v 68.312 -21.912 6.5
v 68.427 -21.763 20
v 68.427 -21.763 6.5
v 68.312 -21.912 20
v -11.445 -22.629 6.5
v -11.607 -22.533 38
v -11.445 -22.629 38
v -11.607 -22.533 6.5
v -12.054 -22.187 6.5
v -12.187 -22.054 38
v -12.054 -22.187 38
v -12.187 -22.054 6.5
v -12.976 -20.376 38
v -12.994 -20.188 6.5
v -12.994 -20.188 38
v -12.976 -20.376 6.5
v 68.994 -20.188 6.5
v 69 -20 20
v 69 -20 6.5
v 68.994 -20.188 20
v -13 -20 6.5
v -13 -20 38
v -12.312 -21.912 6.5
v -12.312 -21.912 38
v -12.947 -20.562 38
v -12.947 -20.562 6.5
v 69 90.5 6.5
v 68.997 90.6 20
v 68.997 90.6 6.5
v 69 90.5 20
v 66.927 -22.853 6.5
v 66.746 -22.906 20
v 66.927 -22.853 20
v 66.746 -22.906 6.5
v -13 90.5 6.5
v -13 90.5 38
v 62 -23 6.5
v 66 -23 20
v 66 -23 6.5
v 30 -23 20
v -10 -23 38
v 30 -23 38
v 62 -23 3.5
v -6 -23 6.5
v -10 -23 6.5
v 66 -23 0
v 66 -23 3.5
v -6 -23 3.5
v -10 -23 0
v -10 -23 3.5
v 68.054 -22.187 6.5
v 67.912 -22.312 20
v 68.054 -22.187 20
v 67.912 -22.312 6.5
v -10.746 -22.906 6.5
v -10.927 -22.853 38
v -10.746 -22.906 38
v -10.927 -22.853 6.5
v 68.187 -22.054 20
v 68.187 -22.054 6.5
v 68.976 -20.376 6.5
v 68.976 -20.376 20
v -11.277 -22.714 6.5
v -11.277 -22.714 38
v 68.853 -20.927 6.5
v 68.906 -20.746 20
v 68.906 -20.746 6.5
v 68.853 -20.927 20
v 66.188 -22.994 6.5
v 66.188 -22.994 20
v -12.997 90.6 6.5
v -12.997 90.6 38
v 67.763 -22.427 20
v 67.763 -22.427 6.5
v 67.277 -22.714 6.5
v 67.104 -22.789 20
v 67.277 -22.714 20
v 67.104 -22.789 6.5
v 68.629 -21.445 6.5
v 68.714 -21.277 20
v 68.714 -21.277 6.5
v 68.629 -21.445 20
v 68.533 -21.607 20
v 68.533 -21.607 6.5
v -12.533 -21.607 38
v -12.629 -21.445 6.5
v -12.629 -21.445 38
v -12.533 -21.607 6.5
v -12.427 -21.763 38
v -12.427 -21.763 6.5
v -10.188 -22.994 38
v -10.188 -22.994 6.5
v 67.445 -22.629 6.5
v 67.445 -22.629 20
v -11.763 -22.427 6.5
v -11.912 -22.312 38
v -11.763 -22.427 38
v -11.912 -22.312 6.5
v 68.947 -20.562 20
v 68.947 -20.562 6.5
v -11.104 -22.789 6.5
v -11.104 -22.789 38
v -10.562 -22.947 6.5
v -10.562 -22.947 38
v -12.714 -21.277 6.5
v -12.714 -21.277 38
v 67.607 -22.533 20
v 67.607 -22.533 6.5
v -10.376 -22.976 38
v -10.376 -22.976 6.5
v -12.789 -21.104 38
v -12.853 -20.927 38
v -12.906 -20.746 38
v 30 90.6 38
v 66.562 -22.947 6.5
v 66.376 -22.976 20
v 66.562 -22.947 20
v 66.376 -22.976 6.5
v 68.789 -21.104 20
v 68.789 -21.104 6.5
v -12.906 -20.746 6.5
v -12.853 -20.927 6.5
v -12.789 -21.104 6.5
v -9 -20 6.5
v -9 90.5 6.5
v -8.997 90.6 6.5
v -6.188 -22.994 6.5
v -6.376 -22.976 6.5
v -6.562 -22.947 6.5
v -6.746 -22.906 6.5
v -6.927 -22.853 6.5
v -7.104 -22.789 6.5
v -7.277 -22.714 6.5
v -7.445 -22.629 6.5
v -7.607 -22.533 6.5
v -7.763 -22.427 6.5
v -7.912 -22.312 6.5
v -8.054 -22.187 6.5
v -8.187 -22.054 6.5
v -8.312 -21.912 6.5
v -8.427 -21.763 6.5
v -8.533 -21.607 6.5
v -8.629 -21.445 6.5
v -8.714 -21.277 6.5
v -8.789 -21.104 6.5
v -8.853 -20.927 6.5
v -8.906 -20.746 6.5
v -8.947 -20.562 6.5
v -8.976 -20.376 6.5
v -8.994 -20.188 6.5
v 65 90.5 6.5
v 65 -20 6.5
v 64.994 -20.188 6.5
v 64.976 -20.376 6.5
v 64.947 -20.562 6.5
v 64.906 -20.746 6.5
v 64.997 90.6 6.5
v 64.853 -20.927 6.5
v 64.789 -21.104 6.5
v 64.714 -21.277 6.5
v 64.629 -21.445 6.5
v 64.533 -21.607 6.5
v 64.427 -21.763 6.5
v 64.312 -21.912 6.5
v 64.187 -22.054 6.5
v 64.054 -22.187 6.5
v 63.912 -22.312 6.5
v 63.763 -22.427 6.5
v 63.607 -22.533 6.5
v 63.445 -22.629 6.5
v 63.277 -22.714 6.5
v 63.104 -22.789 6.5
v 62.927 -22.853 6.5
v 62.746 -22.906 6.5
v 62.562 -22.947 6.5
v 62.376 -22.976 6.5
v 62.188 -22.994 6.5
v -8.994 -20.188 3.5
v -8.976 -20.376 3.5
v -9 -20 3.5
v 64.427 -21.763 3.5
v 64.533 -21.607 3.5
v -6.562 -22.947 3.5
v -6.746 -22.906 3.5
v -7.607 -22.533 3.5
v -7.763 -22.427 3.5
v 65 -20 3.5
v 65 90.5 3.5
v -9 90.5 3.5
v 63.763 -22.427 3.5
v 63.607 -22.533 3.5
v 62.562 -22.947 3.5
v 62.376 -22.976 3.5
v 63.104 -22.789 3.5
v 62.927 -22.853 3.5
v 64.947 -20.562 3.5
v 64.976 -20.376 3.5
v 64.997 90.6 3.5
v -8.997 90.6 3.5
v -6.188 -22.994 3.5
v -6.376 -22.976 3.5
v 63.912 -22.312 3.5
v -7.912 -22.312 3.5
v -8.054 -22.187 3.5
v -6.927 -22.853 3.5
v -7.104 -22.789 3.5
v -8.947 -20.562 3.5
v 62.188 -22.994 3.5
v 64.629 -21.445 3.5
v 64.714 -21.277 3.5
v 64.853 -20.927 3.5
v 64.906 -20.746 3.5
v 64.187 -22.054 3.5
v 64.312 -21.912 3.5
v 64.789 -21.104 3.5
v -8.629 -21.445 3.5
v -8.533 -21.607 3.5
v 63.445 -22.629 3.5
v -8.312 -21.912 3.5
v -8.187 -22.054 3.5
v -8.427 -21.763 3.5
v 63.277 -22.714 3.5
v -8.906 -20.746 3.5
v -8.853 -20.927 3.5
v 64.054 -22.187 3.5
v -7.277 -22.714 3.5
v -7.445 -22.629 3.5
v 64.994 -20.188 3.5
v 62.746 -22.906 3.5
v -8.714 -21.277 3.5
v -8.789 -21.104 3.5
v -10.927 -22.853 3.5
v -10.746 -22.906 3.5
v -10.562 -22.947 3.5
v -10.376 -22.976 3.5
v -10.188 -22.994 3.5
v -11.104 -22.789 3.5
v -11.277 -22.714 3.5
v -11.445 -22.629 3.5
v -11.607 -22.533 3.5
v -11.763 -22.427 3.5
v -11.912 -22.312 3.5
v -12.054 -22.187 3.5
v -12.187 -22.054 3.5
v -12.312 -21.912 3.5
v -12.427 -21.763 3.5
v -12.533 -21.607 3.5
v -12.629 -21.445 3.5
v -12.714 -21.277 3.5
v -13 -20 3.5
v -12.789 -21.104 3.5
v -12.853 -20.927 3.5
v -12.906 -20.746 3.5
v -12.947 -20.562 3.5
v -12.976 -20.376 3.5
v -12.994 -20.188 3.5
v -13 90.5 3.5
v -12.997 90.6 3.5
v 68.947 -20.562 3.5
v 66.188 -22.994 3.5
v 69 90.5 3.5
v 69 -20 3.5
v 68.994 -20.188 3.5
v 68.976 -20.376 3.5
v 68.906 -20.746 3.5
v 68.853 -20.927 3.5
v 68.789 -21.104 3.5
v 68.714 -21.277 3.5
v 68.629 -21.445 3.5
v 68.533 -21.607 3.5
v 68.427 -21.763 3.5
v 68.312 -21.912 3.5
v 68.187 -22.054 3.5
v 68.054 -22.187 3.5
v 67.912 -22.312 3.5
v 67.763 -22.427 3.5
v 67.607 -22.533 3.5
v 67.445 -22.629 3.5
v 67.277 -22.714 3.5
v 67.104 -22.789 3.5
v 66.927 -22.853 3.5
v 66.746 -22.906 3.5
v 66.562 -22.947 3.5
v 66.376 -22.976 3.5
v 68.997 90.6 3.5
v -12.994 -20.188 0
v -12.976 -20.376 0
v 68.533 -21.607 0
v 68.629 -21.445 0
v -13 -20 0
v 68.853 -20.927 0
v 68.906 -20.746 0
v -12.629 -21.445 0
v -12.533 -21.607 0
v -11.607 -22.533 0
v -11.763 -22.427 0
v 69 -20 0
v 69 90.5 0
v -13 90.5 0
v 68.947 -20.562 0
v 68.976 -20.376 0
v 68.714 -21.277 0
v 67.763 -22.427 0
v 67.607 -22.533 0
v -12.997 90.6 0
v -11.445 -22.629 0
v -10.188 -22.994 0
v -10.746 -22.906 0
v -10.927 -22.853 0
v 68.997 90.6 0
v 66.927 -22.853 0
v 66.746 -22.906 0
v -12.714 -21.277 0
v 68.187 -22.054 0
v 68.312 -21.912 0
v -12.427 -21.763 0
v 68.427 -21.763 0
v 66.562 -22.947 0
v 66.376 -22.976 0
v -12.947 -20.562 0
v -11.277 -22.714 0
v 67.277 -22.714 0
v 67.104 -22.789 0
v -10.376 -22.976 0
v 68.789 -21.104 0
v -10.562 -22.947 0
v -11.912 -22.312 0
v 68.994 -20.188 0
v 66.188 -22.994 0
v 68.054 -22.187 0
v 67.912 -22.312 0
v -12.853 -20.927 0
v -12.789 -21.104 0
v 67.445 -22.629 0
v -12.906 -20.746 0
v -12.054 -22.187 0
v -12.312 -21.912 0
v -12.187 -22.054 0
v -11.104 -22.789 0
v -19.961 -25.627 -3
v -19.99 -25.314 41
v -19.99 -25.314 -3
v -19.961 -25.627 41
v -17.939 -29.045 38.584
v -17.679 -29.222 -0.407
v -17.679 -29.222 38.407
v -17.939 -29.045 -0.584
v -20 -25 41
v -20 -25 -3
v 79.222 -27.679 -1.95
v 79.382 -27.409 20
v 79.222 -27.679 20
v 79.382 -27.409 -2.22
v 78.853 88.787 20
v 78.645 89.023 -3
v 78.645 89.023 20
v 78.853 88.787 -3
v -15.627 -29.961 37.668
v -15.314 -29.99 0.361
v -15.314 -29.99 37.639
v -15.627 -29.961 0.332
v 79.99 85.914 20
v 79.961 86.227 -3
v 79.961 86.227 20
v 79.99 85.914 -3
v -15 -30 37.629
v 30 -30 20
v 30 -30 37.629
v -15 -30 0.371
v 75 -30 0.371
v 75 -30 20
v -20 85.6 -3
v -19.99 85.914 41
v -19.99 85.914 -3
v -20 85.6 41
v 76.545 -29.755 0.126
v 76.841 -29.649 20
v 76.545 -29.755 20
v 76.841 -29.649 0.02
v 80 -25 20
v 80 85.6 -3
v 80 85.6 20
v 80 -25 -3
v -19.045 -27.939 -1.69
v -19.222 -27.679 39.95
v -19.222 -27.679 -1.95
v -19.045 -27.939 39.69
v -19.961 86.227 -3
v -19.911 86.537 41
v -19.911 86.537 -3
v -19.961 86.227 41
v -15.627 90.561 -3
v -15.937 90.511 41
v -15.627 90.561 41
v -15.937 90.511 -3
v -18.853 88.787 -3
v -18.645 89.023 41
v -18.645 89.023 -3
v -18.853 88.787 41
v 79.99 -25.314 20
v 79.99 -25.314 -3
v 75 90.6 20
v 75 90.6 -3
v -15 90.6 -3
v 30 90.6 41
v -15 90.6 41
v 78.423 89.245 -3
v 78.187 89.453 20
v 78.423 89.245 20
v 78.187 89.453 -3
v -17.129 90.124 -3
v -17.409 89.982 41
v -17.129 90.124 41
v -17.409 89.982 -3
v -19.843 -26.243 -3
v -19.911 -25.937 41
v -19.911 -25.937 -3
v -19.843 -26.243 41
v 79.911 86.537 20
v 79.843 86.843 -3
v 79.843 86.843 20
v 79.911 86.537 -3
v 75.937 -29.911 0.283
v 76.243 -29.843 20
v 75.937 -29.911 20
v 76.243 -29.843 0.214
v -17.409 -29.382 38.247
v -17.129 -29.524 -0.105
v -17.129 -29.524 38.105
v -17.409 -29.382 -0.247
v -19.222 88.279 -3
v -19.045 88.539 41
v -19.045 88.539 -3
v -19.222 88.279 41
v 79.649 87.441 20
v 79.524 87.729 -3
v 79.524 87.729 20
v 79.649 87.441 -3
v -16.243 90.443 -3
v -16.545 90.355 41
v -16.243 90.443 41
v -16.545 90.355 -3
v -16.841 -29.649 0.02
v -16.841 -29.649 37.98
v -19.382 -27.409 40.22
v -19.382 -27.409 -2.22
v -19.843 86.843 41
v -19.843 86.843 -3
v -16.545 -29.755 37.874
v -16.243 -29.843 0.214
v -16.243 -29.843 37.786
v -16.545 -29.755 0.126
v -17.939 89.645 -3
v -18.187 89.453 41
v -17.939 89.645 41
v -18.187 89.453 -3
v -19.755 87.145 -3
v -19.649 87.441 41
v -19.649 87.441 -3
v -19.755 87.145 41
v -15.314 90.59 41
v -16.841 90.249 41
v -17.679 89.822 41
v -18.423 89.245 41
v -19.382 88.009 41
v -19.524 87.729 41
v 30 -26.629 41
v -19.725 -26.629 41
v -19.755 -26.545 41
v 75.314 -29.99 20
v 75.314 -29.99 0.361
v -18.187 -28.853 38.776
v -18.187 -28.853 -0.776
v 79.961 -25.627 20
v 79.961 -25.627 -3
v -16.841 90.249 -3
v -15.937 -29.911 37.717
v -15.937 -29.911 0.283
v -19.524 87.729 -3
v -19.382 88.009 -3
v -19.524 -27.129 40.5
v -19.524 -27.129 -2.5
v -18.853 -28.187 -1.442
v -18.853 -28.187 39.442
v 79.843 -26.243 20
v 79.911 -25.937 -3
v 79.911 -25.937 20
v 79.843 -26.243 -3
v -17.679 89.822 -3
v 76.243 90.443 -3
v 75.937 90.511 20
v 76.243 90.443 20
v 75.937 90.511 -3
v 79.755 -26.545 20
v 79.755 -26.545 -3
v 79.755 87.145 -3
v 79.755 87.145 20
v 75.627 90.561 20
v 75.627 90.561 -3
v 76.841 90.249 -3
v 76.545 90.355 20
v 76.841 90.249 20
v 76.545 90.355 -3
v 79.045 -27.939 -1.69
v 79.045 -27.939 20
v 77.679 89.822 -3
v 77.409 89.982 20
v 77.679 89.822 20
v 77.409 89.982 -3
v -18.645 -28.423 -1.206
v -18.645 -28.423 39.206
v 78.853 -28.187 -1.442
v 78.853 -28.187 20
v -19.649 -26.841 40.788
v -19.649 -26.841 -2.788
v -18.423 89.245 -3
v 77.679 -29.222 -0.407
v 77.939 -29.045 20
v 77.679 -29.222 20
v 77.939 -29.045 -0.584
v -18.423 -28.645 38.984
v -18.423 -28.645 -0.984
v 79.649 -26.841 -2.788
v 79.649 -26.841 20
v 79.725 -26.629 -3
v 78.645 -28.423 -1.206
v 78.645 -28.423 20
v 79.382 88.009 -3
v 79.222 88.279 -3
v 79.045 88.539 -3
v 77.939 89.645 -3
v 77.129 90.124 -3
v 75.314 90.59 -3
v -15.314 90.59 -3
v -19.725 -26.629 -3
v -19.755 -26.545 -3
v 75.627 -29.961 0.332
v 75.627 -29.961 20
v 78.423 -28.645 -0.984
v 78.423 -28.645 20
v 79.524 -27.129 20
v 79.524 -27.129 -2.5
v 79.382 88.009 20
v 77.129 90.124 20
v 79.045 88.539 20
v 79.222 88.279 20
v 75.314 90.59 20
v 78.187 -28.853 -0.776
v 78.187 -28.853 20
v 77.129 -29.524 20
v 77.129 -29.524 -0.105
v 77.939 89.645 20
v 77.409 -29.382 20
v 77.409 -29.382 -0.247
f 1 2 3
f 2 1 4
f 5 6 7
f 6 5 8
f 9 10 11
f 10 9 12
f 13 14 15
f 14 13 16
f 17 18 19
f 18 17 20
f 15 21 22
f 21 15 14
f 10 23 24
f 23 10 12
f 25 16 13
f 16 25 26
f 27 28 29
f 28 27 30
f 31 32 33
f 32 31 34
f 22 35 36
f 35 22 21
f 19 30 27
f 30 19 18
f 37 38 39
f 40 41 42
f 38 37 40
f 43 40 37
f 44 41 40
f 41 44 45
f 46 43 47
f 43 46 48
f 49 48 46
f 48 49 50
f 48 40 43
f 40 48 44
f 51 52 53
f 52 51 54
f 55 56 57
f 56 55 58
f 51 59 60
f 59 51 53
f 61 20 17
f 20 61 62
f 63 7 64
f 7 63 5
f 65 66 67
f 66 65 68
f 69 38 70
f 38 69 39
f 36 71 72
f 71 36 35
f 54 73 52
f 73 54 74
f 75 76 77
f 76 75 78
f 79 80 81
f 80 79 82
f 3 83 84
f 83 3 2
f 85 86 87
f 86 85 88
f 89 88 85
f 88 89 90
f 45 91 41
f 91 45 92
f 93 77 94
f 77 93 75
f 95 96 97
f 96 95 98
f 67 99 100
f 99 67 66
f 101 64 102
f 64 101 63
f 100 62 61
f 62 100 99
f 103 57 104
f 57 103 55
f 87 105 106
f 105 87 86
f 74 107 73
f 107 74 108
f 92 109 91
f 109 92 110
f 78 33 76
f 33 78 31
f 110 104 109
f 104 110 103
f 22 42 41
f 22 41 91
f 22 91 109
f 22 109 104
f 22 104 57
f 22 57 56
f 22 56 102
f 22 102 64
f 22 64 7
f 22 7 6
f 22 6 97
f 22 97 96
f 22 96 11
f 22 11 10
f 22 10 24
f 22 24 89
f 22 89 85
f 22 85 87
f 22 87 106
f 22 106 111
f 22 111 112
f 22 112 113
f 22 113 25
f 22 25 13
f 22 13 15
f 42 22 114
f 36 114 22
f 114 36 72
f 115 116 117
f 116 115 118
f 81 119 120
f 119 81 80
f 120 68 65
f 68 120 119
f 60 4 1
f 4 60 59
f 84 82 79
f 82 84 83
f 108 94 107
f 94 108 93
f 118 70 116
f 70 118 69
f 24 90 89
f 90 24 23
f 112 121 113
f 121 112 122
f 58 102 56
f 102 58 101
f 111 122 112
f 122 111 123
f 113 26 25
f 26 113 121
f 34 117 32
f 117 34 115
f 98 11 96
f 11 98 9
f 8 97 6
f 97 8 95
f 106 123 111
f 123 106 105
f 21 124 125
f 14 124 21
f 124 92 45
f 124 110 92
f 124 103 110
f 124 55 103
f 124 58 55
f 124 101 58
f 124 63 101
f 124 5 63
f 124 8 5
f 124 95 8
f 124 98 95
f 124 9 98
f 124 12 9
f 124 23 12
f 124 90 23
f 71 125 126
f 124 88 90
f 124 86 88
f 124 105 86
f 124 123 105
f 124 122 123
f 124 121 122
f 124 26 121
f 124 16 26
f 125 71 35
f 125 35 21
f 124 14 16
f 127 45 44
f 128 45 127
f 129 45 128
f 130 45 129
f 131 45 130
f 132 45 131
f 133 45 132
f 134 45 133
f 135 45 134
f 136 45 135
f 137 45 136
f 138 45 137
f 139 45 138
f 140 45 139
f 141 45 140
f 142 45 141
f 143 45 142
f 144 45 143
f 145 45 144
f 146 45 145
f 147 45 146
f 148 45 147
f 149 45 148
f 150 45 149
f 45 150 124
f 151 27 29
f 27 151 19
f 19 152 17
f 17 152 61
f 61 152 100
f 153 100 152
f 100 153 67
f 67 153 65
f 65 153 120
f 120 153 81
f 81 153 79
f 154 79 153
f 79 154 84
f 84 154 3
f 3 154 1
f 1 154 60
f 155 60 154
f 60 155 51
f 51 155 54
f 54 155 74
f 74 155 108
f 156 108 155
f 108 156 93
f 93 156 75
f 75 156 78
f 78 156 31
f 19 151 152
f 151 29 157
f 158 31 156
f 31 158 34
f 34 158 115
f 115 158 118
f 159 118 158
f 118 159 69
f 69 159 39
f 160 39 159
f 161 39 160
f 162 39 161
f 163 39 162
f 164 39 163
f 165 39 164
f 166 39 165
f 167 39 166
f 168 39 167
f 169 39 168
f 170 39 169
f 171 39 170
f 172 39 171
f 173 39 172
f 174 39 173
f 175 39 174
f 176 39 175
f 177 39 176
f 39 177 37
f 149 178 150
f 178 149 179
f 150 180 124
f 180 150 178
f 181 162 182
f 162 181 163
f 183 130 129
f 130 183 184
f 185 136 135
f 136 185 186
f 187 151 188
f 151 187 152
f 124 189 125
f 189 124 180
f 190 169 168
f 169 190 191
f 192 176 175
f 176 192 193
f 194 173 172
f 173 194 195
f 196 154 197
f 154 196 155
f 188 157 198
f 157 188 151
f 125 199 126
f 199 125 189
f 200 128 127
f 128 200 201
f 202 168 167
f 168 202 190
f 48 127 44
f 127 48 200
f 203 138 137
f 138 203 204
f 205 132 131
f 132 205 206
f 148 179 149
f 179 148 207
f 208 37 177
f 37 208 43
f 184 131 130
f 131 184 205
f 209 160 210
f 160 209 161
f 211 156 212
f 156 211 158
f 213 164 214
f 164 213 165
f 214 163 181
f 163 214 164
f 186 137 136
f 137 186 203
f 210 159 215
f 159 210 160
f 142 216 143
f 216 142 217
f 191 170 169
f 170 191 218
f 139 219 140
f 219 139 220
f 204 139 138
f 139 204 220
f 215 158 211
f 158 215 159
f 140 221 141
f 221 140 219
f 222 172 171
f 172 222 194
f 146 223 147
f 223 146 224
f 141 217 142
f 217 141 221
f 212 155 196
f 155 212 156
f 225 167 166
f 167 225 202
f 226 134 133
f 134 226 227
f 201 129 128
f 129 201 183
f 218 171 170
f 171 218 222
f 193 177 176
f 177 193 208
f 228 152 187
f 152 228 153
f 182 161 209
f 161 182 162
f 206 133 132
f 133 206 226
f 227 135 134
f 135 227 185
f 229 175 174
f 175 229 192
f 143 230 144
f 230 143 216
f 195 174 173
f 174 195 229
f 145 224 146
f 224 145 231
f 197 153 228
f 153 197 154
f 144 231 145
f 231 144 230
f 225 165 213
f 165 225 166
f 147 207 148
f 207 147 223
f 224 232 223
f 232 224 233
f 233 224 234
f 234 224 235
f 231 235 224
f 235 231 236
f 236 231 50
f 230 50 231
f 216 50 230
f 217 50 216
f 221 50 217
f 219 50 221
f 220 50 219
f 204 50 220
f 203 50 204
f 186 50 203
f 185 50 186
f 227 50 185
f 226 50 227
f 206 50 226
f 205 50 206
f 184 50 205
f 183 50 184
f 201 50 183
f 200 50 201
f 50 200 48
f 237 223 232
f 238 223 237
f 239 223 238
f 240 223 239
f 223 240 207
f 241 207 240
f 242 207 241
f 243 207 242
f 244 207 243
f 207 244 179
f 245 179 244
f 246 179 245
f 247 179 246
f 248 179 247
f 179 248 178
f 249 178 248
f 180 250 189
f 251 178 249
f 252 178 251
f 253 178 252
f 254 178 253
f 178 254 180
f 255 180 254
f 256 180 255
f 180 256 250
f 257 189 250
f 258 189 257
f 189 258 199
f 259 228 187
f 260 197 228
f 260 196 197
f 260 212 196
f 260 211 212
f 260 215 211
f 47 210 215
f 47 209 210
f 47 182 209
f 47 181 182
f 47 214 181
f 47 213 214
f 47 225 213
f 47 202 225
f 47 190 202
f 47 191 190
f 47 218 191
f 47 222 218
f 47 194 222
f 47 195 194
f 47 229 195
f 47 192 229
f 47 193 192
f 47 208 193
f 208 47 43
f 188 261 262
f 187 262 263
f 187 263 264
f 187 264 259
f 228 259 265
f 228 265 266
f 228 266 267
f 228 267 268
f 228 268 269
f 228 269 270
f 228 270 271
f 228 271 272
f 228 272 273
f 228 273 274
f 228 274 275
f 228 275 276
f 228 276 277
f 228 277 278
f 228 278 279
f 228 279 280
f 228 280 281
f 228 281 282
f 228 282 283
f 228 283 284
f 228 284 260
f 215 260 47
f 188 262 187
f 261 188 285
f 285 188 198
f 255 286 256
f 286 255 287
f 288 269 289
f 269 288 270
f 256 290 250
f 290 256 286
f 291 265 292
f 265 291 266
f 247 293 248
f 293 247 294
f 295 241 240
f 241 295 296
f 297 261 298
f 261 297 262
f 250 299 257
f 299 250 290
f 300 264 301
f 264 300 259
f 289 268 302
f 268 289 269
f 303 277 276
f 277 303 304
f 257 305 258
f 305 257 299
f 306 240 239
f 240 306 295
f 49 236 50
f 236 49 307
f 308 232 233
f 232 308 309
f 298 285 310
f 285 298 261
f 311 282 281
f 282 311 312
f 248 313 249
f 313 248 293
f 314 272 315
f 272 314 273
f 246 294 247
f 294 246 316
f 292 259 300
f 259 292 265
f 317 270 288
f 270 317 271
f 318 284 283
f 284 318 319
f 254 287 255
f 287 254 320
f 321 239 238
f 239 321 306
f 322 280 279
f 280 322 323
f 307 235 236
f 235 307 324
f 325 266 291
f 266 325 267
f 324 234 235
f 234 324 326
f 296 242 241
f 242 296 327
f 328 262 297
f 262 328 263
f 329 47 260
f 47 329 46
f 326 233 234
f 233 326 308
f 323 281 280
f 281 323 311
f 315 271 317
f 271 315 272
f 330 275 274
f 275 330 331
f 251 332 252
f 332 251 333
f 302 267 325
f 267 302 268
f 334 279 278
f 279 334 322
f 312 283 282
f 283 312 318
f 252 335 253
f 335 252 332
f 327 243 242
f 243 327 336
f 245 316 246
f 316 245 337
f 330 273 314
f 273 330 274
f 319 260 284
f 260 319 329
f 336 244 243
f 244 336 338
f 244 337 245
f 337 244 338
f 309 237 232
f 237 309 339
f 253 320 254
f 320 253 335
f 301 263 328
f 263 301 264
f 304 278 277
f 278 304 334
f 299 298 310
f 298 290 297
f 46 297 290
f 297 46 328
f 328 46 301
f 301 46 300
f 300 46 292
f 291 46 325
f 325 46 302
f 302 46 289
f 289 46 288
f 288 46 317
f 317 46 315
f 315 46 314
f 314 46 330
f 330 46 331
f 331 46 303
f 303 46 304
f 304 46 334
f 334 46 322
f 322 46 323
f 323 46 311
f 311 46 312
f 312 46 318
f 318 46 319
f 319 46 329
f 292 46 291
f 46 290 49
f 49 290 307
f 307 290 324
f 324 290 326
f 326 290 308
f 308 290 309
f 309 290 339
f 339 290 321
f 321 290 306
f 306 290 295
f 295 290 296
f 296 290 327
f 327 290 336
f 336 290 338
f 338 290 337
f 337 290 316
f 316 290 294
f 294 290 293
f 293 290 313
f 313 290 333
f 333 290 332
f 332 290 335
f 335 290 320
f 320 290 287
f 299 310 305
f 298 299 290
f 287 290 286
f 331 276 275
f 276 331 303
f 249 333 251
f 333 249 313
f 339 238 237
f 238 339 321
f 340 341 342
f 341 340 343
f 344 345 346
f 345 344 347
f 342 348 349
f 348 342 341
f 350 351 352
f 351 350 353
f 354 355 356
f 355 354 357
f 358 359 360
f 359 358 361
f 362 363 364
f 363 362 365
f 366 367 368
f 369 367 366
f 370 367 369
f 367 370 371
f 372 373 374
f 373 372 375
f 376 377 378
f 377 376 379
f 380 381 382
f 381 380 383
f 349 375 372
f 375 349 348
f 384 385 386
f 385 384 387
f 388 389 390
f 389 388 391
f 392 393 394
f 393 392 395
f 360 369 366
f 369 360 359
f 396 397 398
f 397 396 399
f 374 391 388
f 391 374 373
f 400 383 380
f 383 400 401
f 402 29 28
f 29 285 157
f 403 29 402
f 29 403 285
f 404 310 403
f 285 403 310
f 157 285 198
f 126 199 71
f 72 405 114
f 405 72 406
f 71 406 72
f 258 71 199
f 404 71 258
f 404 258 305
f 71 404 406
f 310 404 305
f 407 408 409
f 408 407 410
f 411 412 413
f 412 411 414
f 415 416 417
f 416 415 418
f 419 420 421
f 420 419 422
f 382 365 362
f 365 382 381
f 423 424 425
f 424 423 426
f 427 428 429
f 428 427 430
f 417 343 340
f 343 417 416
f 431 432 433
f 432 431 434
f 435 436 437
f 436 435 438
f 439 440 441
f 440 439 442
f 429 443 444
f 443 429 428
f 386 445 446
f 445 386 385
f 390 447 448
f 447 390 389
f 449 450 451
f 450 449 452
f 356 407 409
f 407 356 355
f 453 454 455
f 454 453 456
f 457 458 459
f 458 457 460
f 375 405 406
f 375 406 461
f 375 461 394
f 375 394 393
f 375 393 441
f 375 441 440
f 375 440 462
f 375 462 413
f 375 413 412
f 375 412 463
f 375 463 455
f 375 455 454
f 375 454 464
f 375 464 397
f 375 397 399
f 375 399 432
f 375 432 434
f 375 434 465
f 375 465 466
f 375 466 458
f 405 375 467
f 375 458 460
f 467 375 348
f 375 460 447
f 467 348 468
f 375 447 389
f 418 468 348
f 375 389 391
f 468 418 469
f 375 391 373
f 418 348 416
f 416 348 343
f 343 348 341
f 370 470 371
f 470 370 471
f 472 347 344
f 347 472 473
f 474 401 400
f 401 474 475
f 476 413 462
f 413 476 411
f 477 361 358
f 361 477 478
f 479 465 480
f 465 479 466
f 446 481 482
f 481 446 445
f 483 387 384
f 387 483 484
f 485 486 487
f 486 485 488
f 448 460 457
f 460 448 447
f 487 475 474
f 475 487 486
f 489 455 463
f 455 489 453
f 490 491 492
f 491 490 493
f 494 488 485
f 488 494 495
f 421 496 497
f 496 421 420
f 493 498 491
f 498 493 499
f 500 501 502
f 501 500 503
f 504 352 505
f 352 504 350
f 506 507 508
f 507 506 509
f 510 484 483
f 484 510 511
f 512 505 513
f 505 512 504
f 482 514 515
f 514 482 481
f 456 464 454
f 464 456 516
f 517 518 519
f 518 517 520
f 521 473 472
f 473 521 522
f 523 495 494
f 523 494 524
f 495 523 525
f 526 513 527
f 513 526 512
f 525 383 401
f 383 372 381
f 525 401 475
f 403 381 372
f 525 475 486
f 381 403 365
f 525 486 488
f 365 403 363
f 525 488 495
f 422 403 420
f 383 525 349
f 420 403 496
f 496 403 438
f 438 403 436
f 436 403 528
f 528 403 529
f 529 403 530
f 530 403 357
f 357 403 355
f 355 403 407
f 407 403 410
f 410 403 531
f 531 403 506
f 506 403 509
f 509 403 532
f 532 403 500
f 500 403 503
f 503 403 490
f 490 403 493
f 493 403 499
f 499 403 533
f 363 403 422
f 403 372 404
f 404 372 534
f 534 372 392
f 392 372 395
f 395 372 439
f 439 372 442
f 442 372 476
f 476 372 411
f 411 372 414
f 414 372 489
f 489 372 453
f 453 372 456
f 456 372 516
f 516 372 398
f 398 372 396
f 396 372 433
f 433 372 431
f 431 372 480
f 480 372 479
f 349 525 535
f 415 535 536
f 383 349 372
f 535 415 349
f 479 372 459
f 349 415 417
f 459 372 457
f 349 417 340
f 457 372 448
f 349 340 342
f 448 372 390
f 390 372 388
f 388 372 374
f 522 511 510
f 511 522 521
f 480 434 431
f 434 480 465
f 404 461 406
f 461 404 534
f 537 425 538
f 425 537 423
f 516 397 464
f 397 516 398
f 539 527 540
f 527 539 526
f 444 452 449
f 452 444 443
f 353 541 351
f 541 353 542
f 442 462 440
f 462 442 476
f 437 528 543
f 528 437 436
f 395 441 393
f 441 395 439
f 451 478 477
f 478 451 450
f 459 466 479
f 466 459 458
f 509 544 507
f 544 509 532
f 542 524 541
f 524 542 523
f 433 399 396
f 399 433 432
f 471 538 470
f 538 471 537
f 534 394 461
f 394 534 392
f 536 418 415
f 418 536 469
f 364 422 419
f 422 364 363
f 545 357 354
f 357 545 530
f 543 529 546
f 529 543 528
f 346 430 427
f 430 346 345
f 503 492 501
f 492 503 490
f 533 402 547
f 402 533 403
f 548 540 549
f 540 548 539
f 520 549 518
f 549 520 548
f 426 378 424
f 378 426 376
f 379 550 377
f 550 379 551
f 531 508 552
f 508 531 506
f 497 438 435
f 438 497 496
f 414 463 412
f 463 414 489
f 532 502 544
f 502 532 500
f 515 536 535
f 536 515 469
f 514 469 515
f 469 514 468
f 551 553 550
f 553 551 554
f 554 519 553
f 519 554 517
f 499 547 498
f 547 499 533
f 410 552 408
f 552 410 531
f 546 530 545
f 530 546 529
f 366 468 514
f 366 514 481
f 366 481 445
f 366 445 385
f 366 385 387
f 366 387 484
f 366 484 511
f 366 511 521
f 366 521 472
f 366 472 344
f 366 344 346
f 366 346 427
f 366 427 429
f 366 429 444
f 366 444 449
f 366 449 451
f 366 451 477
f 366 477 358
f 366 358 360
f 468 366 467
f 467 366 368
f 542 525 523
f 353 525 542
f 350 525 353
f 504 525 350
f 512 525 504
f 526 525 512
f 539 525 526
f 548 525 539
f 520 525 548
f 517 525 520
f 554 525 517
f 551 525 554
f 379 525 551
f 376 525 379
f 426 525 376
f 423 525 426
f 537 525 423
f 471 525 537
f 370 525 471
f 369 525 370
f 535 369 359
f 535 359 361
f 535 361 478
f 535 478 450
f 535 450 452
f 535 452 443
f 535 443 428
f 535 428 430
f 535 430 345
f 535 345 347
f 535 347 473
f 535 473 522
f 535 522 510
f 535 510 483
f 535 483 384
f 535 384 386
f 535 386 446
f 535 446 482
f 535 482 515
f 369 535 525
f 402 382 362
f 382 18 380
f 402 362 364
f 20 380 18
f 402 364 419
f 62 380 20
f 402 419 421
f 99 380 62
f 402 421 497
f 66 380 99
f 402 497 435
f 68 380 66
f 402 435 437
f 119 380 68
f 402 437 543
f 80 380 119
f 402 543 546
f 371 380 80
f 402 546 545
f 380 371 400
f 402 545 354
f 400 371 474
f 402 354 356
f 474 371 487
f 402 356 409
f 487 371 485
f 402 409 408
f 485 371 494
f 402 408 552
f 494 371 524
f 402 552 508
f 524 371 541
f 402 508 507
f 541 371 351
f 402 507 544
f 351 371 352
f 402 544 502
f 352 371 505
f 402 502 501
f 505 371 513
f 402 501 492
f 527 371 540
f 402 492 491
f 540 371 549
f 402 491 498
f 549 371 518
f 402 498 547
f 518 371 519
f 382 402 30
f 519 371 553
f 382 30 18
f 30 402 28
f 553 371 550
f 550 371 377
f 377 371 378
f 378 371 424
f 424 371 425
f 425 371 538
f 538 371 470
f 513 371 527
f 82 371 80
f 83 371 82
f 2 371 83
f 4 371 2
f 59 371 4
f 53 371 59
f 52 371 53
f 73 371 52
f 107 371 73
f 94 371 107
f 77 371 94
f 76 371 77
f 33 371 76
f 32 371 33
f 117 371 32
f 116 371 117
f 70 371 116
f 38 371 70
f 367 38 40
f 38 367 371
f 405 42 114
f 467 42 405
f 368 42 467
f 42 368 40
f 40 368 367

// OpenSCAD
*color([0.5,0,0]) linear_extrude(3) {
    translate([-10,-20,0]) hull(){
        circle(3,$fn=100);
        translate([76,0,0]) circle(3,$fn=100);
        translate([0,105.6,0]) circle(3,$fn=100);
        translate([76,105.6,0]) circle(3,$fn=100);
    }
}

difference() {
    translate([-15,-25,-3]) linear_extrude(44) hull(){
        circle(5,$fn=100);
        translate([90,0,0]) circle(5,$fn=100);
        translate([0,110.6,0]) circle(5,$fn=100);
        translate([90,110.6,0]) circle(5,$fn=100);
    }
    union() {
        translate([-10,-20,6.5]) linear_extrude(31.5) {
            hull(){
                circle(3,$fn=100);
                translate([76,0,0]) circle(3,$fn=100);
                translate([0,110.5,0]) circle(3,$fn=100);
                translate([76,110.5,0]) circle(3,$fn=100);
            }
        }
        translate([-10,-20,3.5]) linear_extrude(3) {
            hull(){
                translate([4,0,0]) circle(3,$fn=100);
                translate([72,0,0]) circle(3,$fn=100);
                translate([4,110.5,0]) circle(3,$fn=100);
                translate([72,110.5,0]) circle(3,$fn=100);
            }
        }
        translate([-10,-20,0]) linear_extrude(3.5) {
            hull(){
                circle(3,$fn=100);
                translate([76,0,0]) circle(3,$fn=100);
                translate([0,110.5,0]) circle(3,$fn=100);
                translate([76,110.5,0]) circle(3,$fn=100);
            }
        }
    }
    // 面取り
    translate([-30,-33.6,41.1]) rotate([45,0,0]) rotate([0,90,0]) linear_extrude(130) square([5,5]);
    translate([-30,-33.6,-3.1]) rotate([45,0,0]) rotate([0,90,0]) linear_extrude(130) square([5,5]);
    // ケーブルを逃がす
    color([1,0,0]) translate([30,-35,20]) linear_extrude(50) square([60,130]);
}
